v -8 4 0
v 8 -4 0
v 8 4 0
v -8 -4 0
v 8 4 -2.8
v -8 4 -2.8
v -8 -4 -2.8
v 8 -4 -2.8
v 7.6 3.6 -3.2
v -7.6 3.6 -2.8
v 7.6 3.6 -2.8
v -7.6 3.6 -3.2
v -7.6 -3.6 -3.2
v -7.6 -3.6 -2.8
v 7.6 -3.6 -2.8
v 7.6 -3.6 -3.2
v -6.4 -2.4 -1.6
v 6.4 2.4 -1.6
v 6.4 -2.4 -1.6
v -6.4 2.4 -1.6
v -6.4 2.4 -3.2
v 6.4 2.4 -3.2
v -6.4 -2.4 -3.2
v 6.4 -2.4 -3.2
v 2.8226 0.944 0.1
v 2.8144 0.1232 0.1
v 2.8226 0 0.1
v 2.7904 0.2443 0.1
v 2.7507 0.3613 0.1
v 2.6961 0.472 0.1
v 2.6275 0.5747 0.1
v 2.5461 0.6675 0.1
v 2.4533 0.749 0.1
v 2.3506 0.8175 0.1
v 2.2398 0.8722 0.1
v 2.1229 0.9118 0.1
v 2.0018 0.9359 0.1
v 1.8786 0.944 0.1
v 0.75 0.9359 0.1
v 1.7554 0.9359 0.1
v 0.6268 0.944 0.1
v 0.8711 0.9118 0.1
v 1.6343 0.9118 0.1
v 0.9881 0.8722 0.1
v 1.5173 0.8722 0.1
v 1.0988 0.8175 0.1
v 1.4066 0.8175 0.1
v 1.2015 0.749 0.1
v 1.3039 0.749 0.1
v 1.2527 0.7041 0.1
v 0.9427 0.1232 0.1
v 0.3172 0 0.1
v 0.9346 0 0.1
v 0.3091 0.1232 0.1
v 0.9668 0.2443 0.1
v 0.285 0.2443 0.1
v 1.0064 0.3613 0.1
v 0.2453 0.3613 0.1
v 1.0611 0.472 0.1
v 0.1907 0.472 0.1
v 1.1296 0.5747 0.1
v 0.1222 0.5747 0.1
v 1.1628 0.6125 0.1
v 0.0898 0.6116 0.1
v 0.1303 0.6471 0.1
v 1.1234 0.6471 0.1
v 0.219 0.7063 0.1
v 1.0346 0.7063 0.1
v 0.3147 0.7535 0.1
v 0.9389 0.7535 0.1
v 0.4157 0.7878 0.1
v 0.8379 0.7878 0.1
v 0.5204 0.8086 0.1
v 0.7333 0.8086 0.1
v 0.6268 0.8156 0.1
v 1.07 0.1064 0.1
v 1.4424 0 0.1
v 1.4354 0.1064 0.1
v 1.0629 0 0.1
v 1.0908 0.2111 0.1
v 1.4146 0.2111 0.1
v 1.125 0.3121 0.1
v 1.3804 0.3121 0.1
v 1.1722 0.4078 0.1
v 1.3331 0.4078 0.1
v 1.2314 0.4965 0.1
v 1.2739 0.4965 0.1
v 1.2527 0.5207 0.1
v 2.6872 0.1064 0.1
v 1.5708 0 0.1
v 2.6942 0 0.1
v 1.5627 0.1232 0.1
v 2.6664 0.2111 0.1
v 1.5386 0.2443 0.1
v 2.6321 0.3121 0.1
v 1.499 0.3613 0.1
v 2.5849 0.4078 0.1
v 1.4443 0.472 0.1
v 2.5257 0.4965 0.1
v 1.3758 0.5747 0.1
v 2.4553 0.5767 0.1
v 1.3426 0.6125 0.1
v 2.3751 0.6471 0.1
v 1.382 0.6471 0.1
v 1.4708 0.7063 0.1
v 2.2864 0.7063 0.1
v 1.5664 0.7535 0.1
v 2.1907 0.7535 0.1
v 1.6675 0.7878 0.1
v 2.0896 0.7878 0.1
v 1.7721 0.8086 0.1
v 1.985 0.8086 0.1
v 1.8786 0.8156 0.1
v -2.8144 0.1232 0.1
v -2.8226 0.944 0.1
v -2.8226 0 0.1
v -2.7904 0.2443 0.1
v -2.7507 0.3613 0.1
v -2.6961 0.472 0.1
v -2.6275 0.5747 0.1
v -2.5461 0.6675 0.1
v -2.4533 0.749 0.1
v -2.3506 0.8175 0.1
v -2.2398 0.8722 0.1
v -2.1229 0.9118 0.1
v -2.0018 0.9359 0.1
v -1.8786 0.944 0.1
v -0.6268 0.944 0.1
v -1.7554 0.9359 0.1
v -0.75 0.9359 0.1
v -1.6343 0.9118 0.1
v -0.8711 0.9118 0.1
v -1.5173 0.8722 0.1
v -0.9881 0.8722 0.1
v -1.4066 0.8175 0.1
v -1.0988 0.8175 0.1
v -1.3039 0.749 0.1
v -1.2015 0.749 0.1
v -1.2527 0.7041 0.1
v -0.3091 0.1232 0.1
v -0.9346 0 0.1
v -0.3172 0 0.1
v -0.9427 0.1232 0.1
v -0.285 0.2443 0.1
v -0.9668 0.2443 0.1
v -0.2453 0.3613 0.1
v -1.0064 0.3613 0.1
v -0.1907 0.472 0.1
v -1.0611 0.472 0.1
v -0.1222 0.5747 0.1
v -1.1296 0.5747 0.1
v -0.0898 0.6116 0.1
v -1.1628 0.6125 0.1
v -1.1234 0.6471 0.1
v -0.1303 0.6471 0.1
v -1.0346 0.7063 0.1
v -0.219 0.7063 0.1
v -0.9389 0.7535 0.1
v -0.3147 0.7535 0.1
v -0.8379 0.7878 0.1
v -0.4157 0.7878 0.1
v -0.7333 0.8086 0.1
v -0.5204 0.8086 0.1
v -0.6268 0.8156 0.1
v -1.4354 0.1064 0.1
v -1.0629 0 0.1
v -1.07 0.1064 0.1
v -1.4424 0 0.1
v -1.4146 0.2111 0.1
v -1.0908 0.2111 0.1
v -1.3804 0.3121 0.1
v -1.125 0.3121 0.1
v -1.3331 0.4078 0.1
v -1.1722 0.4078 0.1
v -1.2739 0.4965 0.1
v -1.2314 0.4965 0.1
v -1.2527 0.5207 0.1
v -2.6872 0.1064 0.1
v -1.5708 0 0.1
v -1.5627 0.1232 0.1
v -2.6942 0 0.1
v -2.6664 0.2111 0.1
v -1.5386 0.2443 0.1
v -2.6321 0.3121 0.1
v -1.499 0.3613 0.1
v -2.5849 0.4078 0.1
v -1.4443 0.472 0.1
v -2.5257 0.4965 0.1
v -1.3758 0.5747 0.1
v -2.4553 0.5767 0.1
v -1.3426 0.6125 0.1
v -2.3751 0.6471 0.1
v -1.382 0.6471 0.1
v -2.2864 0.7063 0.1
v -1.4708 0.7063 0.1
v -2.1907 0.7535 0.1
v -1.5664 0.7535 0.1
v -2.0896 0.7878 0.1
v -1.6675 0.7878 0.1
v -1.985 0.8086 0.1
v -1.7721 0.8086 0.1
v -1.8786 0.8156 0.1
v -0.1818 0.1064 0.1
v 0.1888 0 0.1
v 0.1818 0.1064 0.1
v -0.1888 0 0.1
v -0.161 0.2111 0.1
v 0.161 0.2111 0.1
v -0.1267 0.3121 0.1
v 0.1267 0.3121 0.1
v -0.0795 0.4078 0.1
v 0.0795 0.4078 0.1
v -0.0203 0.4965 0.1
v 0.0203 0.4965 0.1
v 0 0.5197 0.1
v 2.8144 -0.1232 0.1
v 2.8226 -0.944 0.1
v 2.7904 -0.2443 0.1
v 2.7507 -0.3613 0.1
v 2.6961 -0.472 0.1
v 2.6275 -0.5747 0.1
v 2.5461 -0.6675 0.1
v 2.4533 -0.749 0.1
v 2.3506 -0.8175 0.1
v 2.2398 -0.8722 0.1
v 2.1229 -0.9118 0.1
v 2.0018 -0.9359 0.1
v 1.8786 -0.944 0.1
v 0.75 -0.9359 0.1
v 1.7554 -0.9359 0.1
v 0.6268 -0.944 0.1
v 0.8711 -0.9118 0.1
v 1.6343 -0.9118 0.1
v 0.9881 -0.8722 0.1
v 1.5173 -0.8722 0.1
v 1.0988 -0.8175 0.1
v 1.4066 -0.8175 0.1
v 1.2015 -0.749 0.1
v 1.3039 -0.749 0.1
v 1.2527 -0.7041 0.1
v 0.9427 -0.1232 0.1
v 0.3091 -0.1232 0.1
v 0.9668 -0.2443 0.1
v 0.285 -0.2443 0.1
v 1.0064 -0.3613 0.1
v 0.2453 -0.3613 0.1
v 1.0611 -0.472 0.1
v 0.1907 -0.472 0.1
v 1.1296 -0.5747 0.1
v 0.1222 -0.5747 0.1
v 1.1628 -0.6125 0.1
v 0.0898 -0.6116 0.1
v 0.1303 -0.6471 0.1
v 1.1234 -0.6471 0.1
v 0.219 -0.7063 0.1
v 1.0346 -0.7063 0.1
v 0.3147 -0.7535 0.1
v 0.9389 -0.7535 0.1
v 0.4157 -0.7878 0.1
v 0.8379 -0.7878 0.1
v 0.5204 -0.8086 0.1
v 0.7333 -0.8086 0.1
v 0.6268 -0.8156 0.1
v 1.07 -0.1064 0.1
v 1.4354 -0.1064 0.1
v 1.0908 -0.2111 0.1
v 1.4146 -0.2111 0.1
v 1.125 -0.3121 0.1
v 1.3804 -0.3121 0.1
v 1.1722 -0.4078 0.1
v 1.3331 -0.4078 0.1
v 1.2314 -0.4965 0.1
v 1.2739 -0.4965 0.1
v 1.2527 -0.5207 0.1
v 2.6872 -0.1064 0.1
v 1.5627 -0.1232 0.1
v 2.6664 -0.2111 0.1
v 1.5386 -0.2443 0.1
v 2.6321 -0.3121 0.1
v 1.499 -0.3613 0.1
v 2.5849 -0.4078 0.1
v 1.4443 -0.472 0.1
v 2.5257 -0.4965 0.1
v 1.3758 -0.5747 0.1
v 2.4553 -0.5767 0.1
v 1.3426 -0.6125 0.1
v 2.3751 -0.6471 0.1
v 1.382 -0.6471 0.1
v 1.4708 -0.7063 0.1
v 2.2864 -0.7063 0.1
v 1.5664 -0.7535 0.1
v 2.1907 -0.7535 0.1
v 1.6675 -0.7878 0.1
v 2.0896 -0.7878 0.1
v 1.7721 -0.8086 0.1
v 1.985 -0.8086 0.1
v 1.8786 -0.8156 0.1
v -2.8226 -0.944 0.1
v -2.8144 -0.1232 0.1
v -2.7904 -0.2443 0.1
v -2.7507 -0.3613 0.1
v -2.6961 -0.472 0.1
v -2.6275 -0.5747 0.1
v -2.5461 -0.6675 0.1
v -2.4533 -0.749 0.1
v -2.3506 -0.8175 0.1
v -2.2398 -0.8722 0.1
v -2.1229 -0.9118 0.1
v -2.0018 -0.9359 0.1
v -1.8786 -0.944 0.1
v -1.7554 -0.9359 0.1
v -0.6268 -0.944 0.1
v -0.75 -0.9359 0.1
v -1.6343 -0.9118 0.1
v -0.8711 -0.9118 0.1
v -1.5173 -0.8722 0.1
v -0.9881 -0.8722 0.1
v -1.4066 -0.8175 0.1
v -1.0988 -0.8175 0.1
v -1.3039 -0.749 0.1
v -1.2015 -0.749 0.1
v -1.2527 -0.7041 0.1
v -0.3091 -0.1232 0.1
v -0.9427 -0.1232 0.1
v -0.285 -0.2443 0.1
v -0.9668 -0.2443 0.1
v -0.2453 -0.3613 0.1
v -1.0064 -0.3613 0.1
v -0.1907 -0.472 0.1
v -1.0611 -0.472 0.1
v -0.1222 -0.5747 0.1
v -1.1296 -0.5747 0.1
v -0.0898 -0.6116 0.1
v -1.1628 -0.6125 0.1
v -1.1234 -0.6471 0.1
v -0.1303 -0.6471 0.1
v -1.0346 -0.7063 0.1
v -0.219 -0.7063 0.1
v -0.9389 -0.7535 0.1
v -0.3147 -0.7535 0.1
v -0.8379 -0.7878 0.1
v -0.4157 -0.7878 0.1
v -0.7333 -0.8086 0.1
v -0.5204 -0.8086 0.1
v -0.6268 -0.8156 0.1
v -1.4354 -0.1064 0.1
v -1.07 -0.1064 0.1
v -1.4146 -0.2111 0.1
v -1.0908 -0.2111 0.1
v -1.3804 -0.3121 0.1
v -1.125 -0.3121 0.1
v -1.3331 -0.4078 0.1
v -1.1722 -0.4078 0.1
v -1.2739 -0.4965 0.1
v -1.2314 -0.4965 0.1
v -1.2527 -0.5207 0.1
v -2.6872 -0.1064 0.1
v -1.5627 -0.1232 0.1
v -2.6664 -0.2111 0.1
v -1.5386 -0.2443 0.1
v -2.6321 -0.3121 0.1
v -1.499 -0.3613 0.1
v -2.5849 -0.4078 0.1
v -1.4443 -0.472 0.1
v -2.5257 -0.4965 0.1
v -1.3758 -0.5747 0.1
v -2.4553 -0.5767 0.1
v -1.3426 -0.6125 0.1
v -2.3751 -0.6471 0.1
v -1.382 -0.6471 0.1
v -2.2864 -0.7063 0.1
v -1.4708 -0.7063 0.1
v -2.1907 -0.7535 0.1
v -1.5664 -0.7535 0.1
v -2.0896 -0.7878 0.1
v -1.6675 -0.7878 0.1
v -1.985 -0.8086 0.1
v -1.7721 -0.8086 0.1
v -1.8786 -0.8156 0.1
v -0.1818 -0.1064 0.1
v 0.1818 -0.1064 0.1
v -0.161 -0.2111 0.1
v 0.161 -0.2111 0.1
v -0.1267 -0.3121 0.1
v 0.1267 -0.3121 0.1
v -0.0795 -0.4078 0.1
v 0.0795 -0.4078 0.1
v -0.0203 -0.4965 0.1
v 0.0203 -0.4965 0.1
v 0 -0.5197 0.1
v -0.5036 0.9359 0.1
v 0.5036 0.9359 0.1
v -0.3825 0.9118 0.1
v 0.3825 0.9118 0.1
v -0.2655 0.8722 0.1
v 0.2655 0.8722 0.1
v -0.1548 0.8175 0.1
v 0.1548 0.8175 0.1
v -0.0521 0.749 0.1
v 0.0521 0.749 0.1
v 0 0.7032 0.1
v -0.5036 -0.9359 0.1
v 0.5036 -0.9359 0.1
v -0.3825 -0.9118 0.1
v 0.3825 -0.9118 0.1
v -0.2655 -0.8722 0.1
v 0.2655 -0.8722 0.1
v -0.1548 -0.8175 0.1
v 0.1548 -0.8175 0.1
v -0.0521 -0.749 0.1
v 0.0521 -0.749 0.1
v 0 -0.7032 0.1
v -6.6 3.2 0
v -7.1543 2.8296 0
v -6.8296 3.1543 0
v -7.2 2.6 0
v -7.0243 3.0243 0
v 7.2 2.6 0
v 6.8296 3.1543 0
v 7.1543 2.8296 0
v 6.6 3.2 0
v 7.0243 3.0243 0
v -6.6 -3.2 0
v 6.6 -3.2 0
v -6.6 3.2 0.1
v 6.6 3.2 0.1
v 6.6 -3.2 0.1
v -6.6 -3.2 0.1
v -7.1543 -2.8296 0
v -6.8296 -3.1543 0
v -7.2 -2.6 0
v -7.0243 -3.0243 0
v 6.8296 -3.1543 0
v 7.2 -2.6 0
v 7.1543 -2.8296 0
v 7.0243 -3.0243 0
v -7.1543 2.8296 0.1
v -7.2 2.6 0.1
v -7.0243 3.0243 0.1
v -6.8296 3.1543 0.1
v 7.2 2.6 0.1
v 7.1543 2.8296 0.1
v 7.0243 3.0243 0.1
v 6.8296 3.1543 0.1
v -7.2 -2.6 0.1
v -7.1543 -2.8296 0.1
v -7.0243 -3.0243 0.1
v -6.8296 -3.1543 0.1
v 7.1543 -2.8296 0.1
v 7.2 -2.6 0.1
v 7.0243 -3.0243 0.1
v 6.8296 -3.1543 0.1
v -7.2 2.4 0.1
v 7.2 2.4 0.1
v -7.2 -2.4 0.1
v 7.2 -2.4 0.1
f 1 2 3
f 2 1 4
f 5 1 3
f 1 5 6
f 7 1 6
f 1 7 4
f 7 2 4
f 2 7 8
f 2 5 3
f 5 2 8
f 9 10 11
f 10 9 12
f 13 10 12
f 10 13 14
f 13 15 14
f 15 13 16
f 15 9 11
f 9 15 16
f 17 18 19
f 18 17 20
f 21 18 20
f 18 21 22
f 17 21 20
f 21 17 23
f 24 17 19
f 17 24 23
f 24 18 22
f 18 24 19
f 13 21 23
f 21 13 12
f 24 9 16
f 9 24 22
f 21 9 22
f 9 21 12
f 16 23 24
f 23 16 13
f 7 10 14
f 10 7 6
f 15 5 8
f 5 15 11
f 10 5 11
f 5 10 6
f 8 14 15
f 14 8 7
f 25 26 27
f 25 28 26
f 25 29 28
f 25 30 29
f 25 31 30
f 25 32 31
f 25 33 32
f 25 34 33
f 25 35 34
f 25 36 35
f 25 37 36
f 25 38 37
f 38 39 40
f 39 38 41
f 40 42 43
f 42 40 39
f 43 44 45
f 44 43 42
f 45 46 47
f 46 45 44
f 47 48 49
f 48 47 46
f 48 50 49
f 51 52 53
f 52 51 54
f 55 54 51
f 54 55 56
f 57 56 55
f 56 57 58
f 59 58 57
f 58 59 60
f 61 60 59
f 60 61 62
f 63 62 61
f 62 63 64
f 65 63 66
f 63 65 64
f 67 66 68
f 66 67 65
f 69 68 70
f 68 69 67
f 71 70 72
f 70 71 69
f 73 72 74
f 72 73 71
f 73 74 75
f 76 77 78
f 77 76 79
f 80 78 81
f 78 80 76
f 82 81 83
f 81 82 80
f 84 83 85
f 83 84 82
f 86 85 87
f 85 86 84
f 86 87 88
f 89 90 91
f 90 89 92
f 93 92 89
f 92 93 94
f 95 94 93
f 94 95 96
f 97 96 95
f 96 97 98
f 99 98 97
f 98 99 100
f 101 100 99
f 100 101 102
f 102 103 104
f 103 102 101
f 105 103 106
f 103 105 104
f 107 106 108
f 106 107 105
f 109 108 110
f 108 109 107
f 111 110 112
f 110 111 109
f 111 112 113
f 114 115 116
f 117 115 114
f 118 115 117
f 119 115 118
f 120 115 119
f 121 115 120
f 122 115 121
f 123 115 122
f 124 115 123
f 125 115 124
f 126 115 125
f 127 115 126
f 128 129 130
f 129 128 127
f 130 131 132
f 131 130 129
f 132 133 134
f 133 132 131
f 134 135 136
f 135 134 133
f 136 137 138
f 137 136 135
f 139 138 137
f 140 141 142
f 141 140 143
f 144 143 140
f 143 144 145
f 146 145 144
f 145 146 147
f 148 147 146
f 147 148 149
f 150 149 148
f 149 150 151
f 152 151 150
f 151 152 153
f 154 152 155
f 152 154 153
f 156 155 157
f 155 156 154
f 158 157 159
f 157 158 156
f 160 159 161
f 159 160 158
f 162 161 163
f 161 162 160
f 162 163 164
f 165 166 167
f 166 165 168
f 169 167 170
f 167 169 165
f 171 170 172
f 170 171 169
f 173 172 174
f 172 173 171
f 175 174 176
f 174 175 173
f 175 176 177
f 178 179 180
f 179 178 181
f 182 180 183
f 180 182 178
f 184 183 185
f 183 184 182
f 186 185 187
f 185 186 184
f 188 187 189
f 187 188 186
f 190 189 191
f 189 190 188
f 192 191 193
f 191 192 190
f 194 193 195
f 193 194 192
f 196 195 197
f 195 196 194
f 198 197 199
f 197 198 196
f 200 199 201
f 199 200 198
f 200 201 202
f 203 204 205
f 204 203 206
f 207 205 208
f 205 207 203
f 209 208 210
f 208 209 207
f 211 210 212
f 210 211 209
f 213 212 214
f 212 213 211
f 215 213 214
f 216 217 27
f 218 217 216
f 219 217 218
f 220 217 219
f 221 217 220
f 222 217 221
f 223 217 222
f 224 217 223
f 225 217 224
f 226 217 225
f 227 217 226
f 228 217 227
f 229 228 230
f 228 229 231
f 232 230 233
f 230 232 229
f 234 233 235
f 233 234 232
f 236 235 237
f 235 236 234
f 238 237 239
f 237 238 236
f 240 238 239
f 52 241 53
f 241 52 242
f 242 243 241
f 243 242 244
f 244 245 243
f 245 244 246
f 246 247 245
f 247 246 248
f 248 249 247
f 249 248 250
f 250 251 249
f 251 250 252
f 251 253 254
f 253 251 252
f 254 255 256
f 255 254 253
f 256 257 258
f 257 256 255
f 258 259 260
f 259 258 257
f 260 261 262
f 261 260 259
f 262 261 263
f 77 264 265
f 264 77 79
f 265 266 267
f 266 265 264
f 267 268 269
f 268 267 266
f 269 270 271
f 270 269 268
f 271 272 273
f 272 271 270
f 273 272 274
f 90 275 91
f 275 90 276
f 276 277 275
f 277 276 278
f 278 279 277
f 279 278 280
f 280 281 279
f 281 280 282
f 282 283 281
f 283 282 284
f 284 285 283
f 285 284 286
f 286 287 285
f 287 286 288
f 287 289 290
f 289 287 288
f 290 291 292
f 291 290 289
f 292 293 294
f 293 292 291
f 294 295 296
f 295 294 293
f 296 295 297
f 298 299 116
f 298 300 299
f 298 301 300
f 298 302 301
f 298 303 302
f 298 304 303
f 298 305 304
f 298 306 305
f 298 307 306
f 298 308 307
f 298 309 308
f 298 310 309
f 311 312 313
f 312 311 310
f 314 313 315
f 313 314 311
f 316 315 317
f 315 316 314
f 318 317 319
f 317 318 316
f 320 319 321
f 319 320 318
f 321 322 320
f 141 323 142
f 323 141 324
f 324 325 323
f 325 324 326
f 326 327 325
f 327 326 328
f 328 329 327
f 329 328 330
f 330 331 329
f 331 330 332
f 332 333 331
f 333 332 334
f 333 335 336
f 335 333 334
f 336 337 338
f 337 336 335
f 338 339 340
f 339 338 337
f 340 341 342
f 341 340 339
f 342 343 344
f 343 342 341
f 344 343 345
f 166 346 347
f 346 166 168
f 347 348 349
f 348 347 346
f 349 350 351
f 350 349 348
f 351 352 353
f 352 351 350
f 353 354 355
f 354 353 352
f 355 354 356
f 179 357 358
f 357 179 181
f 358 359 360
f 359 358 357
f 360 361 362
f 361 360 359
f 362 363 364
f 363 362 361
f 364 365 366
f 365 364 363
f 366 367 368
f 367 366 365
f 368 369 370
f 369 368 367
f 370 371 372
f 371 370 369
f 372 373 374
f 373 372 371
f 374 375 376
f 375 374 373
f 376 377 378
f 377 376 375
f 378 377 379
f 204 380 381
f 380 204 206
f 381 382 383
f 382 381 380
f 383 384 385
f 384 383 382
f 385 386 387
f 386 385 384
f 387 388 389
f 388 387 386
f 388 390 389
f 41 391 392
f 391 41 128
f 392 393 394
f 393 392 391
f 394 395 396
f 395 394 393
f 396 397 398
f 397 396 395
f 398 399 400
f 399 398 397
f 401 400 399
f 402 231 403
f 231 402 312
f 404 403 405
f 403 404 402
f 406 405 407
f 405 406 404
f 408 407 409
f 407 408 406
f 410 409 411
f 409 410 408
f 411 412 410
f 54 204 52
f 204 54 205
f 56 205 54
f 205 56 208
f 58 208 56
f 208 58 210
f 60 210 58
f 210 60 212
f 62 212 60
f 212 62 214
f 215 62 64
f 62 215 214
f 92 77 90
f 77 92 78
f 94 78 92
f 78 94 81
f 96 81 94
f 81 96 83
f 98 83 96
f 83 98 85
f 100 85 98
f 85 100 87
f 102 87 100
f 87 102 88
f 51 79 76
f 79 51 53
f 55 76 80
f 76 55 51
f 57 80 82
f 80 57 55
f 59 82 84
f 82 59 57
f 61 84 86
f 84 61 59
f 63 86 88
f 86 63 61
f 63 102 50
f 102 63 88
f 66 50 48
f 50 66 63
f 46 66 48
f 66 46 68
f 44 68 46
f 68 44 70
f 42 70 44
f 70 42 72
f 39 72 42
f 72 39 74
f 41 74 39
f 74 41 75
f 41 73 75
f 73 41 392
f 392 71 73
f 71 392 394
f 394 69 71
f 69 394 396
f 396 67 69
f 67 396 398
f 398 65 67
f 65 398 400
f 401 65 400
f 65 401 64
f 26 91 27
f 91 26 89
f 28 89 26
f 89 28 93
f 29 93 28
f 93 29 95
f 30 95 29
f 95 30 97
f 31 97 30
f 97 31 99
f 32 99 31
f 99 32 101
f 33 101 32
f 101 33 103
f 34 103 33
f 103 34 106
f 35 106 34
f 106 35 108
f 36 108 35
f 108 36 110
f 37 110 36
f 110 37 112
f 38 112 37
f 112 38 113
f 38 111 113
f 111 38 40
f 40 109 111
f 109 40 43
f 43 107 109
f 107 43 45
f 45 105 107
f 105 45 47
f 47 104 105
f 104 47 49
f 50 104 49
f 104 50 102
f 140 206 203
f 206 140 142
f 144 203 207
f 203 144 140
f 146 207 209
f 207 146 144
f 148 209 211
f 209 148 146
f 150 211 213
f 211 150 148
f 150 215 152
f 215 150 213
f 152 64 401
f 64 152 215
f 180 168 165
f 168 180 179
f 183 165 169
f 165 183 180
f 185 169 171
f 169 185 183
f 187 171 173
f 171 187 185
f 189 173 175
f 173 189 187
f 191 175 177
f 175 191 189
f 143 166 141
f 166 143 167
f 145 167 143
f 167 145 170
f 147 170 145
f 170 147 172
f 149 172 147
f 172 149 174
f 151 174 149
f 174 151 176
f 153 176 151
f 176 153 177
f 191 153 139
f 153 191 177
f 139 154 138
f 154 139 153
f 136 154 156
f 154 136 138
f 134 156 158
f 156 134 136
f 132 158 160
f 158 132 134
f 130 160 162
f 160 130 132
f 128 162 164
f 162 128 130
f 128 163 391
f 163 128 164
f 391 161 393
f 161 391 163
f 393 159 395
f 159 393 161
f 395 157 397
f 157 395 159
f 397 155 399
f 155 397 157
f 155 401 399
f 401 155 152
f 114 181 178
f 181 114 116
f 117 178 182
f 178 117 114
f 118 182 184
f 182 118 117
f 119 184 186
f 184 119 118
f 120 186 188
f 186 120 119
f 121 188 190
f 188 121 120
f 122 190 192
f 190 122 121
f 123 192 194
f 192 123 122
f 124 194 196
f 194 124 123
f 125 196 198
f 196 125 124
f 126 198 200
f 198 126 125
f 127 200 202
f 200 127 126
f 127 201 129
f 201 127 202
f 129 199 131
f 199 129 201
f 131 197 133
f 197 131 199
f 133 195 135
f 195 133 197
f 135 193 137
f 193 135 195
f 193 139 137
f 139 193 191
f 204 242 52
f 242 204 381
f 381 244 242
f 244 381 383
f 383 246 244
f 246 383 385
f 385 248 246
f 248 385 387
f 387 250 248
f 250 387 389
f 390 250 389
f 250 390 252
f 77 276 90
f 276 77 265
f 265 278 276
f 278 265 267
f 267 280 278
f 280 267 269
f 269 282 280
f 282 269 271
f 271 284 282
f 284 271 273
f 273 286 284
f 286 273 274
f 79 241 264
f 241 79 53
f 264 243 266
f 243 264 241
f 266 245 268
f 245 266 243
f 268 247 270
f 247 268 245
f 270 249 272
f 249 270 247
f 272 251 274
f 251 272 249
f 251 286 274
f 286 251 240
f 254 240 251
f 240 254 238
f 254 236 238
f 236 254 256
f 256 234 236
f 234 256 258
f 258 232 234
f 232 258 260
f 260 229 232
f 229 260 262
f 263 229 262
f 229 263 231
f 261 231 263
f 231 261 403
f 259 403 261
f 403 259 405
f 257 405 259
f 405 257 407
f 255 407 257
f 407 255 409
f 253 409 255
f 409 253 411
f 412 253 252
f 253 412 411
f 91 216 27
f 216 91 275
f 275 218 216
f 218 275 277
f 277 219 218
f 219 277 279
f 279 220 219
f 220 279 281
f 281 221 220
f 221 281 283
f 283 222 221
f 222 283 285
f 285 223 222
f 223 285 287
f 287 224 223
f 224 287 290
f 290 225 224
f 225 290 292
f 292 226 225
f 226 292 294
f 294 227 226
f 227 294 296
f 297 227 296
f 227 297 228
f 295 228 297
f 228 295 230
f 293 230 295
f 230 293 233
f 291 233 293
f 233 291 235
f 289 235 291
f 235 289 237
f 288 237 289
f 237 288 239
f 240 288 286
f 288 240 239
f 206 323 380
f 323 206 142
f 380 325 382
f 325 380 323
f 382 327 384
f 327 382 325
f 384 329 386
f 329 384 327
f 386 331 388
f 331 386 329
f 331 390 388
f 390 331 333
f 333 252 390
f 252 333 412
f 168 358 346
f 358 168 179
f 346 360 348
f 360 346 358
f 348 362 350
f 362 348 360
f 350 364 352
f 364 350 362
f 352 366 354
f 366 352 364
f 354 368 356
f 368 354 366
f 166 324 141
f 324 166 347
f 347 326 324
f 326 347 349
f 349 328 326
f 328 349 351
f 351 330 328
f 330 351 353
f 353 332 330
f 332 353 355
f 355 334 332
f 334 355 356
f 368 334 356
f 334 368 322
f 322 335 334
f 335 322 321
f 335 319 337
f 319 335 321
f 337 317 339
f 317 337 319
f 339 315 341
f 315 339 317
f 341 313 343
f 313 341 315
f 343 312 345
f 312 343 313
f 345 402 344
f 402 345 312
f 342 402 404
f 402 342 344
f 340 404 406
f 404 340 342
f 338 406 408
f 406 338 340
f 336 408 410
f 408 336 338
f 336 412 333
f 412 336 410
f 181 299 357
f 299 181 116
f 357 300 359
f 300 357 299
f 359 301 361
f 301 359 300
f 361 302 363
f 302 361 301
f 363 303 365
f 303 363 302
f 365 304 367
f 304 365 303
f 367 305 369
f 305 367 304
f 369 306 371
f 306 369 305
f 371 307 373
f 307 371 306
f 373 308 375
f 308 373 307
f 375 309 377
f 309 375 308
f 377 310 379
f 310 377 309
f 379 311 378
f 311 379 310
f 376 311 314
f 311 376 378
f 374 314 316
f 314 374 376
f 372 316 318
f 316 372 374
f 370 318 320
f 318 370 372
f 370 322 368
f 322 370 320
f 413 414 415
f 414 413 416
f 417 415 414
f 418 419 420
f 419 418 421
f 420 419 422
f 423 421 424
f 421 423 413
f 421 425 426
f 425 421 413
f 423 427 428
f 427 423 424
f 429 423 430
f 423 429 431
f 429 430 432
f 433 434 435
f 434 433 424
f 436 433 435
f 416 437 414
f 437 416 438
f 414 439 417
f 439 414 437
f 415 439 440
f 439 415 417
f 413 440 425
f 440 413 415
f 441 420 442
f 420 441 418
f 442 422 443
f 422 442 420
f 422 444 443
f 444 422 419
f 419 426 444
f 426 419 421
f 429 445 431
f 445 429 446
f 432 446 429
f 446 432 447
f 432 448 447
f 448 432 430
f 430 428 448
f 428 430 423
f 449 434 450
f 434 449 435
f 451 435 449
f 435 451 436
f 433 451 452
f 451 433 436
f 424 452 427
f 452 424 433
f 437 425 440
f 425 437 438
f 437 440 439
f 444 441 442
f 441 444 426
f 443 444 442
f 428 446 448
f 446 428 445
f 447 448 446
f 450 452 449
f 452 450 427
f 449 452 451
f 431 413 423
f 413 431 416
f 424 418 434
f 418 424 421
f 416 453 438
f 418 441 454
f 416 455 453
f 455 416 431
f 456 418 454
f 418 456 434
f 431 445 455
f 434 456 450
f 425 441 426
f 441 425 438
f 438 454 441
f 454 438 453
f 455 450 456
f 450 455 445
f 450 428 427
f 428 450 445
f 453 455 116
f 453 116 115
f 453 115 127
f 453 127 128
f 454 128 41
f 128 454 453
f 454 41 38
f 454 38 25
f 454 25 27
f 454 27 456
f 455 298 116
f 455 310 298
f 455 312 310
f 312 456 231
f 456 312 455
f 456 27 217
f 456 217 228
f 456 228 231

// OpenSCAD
use <../lib.scad>
use <3069b.scad>
use <6142271q.scad>
function ldraw_lib__3069bd1h() = [
// 0 Tile  1 x  2 with White Audi Logo on Red Stripe on Black Background Sticker
// 0 Name: 3069bd1h.dat
// 0 Author: Vincent Messenet [Cheenzo]
// 0 !LDRAW_ORG Shortcut UPDATE 2025-03
// 0 !LICENSE Licensed under CC BY 4.0 : see CAreadme.txt
// 
// 0 BFC CERTIFY CCW
  [0,"BFC","CERTIFY"],
  [0,"BFC","CCW"],
// 
// 0 !CATEGORY Sticker Shortcut
// 0 !KEYWORDS Audi R8 LMS ultra, Bricklink 3069pb0511, Set 75873
// 
// 0 !HISTORY 2025-03-30 [OrionP] Official Update 2025-03
// 
// 1 16 0 0 0 1 0 0 0 1 0 0 0 1 3069b.dat
  [1,16,0,0,0,1,0,0,0,1,0,0,0,1, ldraw_lib__3069b()],
// 1 16 0 0 0 1 0 0 0 1 0 0 0 1 6142271q.dat
  [1,16,0,0,0,1,0,0,0,1,0,0,0,1, ldraw_lib__6142271q()],
];
module ldraw_lib__3069bd1h(step=0, col=false, unit=2/5, alt=false, line=0.2, solid=!$preview)
    makepoly(ldraw_lib__3069bd1h(), step=step, col=col, unit=unit, alt=alt, line=line, solid=solid);
ldraw_lib__3069bd1h(line=0.2);
